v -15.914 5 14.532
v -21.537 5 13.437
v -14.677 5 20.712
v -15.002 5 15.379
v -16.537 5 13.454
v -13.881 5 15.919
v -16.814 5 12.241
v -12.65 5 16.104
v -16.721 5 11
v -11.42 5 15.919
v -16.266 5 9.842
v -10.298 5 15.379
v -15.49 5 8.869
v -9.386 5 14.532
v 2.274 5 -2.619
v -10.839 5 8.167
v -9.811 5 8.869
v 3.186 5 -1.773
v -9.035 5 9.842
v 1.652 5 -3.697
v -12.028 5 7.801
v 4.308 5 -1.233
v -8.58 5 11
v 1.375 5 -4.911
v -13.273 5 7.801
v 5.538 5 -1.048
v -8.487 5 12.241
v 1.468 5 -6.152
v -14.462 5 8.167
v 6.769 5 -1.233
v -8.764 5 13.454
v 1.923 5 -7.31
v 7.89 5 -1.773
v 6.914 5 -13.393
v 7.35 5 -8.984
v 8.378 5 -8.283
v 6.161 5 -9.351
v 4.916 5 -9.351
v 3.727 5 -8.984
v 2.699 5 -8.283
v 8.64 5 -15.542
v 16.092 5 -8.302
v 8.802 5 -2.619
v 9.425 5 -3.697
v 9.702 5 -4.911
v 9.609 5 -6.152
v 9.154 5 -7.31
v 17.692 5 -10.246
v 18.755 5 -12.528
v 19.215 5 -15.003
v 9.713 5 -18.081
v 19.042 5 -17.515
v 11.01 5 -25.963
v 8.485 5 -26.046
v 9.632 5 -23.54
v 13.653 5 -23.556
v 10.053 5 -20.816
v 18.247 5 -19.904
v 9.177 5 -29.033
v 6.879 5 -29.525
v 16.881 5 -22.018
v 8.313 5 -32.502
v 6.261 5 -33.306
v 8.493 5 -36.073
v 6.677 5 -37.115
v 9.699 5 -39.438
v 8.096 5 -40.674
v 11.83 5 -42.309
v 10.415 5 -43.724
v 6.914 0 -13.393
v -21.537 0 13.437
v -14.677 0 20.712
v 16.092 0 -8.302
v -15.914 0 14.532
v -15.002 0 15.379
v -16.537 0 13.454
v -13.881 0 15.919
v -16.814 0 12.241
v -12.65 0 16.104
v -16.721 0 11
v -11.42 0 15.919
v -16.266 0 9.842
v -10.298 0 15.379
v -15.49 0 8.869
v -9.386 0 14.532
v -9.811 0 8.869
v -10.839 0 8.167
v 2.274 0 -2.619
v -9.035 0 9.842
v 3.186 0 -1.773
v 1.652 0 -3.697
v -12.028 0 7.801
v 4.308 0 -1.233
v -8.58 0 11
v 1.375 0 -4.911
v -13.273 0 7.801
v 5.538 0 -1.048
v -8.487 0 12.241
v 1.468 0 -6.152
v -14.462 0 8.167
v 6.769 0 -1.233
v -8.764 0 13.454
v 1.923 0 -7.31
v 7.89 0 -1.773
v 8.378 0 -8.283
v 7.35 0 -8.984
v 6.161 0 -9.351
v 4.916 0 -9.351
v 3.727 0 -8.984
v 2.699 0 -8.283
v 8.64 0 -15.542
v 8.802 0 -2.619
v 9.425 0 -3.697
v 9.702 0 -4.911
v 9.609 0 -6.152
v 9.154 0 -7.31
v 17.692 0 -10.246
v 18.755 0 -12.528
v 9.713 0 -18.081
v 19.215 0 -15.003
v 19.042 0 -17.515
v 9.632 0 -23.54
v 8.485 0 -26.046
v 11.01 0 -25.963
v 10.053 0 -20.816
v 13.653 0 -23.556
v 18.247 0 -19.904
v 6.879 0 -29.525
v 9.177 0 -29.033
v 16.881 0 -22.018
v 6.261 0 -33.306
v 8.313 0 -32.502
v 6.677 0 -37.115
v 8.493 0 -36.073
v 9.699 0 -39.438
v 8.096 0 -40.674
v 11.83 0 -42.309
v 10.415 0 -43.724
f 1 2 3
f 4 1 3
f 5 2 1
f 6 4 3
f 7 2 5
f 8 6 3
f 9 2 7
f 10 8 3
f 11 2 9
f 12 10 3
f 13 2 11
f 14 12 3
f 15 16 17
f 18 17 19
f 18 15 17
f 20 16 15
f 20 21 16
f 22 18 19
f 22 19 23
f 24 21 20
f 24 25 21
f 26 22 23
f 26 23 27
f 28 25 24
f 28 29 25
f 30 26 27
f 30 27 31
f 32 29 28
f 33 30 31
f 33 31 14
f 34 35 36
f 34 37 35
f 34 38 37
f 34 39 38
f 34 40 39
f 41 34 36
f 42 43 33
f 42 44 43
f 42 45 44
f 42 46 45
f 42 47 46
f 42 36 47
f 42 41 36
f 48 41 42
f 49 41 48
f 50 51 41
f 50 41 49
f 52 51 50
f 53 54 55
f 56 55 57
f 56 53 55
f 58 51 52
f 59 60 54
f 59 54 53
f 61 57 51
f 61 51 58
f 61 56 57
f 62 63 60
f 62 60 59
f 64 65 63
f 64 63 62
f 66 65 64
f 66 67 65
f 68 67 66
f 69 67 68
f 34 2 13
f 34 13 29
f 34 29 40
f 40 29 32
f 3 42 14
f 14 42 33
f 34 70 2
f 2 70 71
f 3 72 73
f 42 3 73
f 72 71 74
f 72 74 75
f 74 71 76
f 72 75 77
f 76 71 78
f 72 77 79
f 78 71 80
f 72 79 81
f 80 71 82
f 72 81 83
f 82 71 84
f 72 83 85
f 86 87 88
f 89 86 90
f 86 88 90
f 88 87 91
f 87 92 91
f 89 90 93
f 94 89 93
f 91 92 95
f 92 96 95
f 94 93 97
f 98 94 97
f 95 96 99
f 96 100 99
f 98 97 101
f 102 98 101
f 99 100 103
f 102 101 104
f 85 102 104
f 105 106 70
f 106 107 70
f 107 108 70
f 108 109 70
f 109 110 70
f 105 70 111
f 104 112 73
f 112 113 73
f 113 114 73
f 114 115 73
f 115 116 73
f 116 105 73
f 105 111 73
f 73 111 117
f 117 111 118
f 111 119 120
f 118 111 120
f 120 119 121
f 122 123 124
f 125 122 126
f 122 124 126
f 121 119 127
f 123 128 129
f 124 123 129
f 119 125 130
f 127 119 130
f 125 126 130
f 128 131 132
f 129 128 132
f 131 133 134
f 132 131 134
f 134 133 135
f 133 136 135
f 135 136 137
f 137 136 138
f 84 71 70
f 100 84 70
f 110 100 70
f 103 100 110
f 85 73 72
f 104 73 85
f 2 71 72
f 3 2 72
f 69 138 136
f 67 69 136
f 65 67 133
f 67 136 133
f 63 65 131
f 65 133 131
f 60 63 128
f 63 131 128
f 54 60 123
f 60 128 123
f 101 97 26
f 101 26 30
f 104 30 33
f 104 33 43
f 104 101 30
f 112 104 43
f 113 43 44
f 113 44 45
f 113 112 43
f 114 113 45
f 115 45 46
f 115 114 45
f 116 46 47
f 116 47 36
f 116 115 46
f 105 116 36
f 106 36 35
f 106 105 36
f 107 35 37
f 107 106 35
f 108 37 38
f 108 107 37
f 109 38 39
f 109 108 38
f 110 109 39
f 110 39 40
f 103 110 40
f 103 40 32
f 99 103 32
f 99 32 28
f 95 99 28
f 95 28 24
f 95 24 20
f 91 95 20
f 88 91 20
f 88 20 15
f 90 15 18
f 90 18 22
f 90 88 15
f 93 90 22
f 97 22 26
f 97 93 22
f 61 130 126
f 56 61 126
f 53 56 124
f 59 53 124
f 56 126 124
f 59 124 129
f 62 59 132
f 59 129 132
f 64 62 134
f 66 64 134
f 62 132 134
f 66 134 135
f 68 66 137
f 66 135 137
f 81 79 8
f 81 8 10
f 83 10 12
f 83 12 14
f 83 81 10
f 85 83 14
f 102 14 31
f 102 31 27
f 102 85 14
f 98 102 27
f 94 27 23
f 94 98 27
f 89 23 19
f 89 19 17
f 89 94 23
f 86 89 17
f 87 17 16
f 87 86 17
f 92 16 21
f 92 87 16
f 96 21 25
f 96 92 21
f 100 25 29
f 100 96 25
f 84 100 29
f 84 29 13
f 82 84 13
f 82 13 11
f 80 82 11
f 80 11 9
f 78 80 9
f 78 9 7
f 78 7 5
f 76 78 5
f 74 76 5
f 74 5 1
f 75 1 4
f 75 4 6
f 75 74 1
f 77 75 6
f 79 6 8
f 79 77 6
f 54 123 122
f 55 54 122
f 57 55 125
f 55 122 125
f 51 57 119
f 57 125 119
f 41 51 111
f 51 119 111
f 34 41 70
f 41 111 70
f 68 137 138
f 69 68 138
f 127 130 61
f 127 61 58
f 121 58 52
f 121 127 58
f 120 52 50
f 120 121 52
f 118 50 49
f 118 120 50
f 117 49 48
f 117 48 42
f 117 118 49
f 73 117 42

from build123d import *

# Parameters (mm, degrees)
SKETCH_1_R       = 4.175
EXTRUDE_1_DEPTH  = 5
FILLET_1_DEPTH   = 5
FILLET_1_2_DEPTH = 5


with BuildPart() as part:
    # ｽｹｯﾁ1 → ﾎﾞｽ - 押し出し1 (new body)
    # profile 1 of 4: a face of its own
    with BuildSketch(Plane(origin=(0, 0, 0), x_dir=(1, 0, 0), z_dir=(0, 1, 0))):
        Polygon((21.537147831, 13.436802865), (14.676517829, 20.712224225), (-21.537147831, -13.436802865), (-14.676517829, -20.712224225), align=None)
        with Locations(Location((-12.65026681, -11.929041043, 0), (0, 0, 270))):
            Circle(SKETCH_1_R, mode=Mode.SUBTRACT)
        with Locations(Location((5.538286591, 5.222533963, 0), (0, 0, 270))):
            Circle(SKETCH_1_R, mode=Mode.SUBTRACT)
    # profile 2 of 4: a face of its own
    with BuildSketch(Plane(origin=(0, 0, 0), x_dir=(1, 0, 0), z_dir=(0, 1, 0))):
        Polygon((21.537147831, 13.436802865), (-14.676517829, -20.712224225), (-21.537147831, -13.436802865), (14.676517829, 20.712224225), align=None)
        with Locations(Location((5.538286591, 5.222533963, 0), (0, 0, 270))):
            Circle(SKETCH_1_R, mode=Mode.SUBTRACT)
        with Locations(Location((-12.65026681, -11.929041043, 0), (0, 0, 270))):
            Circle(SKETCH_1_R, mode=Mode.SUBTRACT)
    # profile 3 of 4: a face of its own
    with BuildSketch(Plane(origin=(0, 0, 0), x_dir=(1, 0, 0), z_dir=(0, 1, 0))):
        with BuildLine():
            ThreePointArc((19.221377033, 19.536564594), (16.900027476, 19.935279891), (14.676517829, 20.712224225))
            Line((14.676517829, 20.712224225), (21.537147831, 13.436802865))
            ThreePointArc((21.537147831, 13.436802865), (22.425633577, 14.316933157), (23.303261531, 15.207890747))
            Line((23.303261531, 15.207890747), (19.221377033, 19.536564594))
        make_face()
    # profile 4 of 4: a face of its own
    with BuildSketch(Plane(origin=(0, 0, 0), x_dir=(1, 0, 0), z_dir=(0, 1, 0))):
        with BuildLine():
            ThreePointArc((10.415298606, 43.723687992), (6.493592725, 31.097199803), (14.676517829, 20.712224225))
            ThreePointArc((14.676517829, 20.712224225), (16.900027476, 19.935279891), (19.221377033, 19.536564594))
            Line((19.221377033, 19.536564594), (16.881068514, 22.018367371))
            ThreePointArc((16.881068514, 22.018367371), (8.617568994, 30.735491067), (11.829512169, 42.309474429))
            Line((11.829512169, 42.309474429), (10.415298606, 43.723687992))
        make_face()
    extrude(amount=EXTRUDE_1_DEPTH)

    # ﾌｨﾚｯﾄ1: read off the stored shape, not the designer's step
    # ﾌｨﾚｯﾄ1 outline → ﾌｨﾚｯﾄ1 (cut)
    with BuildSketch(Plane(origin=(0, 0, 0), x_dir=(1, 0, 0), z_dir=(0, 1, 0))):
        with BuildLine():
            Line((23.303261531, 15.207890747), (16.881068514, 22.018367371))
            ThreePointArc((16.881068514, 22.018367371), (19.214955148, 15.00333268), (16.092088027, 8.302180578))
            Line((16.092088027, 8.302180578), (21.537147831, 13.436802865))
            ThreePointArc((21.537147831, 13.436802865), (22.425633577, 14.316933157), (23.303261531, 15.207890747))
        make_face()
    extrude(amount=FILLET_1_DEPTH, mode=Mode.SUBTRACT)

    # Fillet 1 2 outline → Fillet 1 2 (add)
    with BuildSketch(Plane(origin=(0, 0, 0), x_dir=(1, 0, 0), z_dir=(0, 1, 0))):
        with BuildLine():
            ThreePointArc((14.676517829, 20.712224225), (11.188521166, 22.924061141), (8.484552975, 26.046063588))
            ThreePointArc((8.484552975, 26.046063588), (9.977695299, 19.436676513), (6.914435143, 13.39267877))
            Line((6.914435143, 13.39267877), (14.676517829, 20.712224225))
        make_face()
    extrude(amount=FILLET_1_2_DEPTH)


solid = part.part
